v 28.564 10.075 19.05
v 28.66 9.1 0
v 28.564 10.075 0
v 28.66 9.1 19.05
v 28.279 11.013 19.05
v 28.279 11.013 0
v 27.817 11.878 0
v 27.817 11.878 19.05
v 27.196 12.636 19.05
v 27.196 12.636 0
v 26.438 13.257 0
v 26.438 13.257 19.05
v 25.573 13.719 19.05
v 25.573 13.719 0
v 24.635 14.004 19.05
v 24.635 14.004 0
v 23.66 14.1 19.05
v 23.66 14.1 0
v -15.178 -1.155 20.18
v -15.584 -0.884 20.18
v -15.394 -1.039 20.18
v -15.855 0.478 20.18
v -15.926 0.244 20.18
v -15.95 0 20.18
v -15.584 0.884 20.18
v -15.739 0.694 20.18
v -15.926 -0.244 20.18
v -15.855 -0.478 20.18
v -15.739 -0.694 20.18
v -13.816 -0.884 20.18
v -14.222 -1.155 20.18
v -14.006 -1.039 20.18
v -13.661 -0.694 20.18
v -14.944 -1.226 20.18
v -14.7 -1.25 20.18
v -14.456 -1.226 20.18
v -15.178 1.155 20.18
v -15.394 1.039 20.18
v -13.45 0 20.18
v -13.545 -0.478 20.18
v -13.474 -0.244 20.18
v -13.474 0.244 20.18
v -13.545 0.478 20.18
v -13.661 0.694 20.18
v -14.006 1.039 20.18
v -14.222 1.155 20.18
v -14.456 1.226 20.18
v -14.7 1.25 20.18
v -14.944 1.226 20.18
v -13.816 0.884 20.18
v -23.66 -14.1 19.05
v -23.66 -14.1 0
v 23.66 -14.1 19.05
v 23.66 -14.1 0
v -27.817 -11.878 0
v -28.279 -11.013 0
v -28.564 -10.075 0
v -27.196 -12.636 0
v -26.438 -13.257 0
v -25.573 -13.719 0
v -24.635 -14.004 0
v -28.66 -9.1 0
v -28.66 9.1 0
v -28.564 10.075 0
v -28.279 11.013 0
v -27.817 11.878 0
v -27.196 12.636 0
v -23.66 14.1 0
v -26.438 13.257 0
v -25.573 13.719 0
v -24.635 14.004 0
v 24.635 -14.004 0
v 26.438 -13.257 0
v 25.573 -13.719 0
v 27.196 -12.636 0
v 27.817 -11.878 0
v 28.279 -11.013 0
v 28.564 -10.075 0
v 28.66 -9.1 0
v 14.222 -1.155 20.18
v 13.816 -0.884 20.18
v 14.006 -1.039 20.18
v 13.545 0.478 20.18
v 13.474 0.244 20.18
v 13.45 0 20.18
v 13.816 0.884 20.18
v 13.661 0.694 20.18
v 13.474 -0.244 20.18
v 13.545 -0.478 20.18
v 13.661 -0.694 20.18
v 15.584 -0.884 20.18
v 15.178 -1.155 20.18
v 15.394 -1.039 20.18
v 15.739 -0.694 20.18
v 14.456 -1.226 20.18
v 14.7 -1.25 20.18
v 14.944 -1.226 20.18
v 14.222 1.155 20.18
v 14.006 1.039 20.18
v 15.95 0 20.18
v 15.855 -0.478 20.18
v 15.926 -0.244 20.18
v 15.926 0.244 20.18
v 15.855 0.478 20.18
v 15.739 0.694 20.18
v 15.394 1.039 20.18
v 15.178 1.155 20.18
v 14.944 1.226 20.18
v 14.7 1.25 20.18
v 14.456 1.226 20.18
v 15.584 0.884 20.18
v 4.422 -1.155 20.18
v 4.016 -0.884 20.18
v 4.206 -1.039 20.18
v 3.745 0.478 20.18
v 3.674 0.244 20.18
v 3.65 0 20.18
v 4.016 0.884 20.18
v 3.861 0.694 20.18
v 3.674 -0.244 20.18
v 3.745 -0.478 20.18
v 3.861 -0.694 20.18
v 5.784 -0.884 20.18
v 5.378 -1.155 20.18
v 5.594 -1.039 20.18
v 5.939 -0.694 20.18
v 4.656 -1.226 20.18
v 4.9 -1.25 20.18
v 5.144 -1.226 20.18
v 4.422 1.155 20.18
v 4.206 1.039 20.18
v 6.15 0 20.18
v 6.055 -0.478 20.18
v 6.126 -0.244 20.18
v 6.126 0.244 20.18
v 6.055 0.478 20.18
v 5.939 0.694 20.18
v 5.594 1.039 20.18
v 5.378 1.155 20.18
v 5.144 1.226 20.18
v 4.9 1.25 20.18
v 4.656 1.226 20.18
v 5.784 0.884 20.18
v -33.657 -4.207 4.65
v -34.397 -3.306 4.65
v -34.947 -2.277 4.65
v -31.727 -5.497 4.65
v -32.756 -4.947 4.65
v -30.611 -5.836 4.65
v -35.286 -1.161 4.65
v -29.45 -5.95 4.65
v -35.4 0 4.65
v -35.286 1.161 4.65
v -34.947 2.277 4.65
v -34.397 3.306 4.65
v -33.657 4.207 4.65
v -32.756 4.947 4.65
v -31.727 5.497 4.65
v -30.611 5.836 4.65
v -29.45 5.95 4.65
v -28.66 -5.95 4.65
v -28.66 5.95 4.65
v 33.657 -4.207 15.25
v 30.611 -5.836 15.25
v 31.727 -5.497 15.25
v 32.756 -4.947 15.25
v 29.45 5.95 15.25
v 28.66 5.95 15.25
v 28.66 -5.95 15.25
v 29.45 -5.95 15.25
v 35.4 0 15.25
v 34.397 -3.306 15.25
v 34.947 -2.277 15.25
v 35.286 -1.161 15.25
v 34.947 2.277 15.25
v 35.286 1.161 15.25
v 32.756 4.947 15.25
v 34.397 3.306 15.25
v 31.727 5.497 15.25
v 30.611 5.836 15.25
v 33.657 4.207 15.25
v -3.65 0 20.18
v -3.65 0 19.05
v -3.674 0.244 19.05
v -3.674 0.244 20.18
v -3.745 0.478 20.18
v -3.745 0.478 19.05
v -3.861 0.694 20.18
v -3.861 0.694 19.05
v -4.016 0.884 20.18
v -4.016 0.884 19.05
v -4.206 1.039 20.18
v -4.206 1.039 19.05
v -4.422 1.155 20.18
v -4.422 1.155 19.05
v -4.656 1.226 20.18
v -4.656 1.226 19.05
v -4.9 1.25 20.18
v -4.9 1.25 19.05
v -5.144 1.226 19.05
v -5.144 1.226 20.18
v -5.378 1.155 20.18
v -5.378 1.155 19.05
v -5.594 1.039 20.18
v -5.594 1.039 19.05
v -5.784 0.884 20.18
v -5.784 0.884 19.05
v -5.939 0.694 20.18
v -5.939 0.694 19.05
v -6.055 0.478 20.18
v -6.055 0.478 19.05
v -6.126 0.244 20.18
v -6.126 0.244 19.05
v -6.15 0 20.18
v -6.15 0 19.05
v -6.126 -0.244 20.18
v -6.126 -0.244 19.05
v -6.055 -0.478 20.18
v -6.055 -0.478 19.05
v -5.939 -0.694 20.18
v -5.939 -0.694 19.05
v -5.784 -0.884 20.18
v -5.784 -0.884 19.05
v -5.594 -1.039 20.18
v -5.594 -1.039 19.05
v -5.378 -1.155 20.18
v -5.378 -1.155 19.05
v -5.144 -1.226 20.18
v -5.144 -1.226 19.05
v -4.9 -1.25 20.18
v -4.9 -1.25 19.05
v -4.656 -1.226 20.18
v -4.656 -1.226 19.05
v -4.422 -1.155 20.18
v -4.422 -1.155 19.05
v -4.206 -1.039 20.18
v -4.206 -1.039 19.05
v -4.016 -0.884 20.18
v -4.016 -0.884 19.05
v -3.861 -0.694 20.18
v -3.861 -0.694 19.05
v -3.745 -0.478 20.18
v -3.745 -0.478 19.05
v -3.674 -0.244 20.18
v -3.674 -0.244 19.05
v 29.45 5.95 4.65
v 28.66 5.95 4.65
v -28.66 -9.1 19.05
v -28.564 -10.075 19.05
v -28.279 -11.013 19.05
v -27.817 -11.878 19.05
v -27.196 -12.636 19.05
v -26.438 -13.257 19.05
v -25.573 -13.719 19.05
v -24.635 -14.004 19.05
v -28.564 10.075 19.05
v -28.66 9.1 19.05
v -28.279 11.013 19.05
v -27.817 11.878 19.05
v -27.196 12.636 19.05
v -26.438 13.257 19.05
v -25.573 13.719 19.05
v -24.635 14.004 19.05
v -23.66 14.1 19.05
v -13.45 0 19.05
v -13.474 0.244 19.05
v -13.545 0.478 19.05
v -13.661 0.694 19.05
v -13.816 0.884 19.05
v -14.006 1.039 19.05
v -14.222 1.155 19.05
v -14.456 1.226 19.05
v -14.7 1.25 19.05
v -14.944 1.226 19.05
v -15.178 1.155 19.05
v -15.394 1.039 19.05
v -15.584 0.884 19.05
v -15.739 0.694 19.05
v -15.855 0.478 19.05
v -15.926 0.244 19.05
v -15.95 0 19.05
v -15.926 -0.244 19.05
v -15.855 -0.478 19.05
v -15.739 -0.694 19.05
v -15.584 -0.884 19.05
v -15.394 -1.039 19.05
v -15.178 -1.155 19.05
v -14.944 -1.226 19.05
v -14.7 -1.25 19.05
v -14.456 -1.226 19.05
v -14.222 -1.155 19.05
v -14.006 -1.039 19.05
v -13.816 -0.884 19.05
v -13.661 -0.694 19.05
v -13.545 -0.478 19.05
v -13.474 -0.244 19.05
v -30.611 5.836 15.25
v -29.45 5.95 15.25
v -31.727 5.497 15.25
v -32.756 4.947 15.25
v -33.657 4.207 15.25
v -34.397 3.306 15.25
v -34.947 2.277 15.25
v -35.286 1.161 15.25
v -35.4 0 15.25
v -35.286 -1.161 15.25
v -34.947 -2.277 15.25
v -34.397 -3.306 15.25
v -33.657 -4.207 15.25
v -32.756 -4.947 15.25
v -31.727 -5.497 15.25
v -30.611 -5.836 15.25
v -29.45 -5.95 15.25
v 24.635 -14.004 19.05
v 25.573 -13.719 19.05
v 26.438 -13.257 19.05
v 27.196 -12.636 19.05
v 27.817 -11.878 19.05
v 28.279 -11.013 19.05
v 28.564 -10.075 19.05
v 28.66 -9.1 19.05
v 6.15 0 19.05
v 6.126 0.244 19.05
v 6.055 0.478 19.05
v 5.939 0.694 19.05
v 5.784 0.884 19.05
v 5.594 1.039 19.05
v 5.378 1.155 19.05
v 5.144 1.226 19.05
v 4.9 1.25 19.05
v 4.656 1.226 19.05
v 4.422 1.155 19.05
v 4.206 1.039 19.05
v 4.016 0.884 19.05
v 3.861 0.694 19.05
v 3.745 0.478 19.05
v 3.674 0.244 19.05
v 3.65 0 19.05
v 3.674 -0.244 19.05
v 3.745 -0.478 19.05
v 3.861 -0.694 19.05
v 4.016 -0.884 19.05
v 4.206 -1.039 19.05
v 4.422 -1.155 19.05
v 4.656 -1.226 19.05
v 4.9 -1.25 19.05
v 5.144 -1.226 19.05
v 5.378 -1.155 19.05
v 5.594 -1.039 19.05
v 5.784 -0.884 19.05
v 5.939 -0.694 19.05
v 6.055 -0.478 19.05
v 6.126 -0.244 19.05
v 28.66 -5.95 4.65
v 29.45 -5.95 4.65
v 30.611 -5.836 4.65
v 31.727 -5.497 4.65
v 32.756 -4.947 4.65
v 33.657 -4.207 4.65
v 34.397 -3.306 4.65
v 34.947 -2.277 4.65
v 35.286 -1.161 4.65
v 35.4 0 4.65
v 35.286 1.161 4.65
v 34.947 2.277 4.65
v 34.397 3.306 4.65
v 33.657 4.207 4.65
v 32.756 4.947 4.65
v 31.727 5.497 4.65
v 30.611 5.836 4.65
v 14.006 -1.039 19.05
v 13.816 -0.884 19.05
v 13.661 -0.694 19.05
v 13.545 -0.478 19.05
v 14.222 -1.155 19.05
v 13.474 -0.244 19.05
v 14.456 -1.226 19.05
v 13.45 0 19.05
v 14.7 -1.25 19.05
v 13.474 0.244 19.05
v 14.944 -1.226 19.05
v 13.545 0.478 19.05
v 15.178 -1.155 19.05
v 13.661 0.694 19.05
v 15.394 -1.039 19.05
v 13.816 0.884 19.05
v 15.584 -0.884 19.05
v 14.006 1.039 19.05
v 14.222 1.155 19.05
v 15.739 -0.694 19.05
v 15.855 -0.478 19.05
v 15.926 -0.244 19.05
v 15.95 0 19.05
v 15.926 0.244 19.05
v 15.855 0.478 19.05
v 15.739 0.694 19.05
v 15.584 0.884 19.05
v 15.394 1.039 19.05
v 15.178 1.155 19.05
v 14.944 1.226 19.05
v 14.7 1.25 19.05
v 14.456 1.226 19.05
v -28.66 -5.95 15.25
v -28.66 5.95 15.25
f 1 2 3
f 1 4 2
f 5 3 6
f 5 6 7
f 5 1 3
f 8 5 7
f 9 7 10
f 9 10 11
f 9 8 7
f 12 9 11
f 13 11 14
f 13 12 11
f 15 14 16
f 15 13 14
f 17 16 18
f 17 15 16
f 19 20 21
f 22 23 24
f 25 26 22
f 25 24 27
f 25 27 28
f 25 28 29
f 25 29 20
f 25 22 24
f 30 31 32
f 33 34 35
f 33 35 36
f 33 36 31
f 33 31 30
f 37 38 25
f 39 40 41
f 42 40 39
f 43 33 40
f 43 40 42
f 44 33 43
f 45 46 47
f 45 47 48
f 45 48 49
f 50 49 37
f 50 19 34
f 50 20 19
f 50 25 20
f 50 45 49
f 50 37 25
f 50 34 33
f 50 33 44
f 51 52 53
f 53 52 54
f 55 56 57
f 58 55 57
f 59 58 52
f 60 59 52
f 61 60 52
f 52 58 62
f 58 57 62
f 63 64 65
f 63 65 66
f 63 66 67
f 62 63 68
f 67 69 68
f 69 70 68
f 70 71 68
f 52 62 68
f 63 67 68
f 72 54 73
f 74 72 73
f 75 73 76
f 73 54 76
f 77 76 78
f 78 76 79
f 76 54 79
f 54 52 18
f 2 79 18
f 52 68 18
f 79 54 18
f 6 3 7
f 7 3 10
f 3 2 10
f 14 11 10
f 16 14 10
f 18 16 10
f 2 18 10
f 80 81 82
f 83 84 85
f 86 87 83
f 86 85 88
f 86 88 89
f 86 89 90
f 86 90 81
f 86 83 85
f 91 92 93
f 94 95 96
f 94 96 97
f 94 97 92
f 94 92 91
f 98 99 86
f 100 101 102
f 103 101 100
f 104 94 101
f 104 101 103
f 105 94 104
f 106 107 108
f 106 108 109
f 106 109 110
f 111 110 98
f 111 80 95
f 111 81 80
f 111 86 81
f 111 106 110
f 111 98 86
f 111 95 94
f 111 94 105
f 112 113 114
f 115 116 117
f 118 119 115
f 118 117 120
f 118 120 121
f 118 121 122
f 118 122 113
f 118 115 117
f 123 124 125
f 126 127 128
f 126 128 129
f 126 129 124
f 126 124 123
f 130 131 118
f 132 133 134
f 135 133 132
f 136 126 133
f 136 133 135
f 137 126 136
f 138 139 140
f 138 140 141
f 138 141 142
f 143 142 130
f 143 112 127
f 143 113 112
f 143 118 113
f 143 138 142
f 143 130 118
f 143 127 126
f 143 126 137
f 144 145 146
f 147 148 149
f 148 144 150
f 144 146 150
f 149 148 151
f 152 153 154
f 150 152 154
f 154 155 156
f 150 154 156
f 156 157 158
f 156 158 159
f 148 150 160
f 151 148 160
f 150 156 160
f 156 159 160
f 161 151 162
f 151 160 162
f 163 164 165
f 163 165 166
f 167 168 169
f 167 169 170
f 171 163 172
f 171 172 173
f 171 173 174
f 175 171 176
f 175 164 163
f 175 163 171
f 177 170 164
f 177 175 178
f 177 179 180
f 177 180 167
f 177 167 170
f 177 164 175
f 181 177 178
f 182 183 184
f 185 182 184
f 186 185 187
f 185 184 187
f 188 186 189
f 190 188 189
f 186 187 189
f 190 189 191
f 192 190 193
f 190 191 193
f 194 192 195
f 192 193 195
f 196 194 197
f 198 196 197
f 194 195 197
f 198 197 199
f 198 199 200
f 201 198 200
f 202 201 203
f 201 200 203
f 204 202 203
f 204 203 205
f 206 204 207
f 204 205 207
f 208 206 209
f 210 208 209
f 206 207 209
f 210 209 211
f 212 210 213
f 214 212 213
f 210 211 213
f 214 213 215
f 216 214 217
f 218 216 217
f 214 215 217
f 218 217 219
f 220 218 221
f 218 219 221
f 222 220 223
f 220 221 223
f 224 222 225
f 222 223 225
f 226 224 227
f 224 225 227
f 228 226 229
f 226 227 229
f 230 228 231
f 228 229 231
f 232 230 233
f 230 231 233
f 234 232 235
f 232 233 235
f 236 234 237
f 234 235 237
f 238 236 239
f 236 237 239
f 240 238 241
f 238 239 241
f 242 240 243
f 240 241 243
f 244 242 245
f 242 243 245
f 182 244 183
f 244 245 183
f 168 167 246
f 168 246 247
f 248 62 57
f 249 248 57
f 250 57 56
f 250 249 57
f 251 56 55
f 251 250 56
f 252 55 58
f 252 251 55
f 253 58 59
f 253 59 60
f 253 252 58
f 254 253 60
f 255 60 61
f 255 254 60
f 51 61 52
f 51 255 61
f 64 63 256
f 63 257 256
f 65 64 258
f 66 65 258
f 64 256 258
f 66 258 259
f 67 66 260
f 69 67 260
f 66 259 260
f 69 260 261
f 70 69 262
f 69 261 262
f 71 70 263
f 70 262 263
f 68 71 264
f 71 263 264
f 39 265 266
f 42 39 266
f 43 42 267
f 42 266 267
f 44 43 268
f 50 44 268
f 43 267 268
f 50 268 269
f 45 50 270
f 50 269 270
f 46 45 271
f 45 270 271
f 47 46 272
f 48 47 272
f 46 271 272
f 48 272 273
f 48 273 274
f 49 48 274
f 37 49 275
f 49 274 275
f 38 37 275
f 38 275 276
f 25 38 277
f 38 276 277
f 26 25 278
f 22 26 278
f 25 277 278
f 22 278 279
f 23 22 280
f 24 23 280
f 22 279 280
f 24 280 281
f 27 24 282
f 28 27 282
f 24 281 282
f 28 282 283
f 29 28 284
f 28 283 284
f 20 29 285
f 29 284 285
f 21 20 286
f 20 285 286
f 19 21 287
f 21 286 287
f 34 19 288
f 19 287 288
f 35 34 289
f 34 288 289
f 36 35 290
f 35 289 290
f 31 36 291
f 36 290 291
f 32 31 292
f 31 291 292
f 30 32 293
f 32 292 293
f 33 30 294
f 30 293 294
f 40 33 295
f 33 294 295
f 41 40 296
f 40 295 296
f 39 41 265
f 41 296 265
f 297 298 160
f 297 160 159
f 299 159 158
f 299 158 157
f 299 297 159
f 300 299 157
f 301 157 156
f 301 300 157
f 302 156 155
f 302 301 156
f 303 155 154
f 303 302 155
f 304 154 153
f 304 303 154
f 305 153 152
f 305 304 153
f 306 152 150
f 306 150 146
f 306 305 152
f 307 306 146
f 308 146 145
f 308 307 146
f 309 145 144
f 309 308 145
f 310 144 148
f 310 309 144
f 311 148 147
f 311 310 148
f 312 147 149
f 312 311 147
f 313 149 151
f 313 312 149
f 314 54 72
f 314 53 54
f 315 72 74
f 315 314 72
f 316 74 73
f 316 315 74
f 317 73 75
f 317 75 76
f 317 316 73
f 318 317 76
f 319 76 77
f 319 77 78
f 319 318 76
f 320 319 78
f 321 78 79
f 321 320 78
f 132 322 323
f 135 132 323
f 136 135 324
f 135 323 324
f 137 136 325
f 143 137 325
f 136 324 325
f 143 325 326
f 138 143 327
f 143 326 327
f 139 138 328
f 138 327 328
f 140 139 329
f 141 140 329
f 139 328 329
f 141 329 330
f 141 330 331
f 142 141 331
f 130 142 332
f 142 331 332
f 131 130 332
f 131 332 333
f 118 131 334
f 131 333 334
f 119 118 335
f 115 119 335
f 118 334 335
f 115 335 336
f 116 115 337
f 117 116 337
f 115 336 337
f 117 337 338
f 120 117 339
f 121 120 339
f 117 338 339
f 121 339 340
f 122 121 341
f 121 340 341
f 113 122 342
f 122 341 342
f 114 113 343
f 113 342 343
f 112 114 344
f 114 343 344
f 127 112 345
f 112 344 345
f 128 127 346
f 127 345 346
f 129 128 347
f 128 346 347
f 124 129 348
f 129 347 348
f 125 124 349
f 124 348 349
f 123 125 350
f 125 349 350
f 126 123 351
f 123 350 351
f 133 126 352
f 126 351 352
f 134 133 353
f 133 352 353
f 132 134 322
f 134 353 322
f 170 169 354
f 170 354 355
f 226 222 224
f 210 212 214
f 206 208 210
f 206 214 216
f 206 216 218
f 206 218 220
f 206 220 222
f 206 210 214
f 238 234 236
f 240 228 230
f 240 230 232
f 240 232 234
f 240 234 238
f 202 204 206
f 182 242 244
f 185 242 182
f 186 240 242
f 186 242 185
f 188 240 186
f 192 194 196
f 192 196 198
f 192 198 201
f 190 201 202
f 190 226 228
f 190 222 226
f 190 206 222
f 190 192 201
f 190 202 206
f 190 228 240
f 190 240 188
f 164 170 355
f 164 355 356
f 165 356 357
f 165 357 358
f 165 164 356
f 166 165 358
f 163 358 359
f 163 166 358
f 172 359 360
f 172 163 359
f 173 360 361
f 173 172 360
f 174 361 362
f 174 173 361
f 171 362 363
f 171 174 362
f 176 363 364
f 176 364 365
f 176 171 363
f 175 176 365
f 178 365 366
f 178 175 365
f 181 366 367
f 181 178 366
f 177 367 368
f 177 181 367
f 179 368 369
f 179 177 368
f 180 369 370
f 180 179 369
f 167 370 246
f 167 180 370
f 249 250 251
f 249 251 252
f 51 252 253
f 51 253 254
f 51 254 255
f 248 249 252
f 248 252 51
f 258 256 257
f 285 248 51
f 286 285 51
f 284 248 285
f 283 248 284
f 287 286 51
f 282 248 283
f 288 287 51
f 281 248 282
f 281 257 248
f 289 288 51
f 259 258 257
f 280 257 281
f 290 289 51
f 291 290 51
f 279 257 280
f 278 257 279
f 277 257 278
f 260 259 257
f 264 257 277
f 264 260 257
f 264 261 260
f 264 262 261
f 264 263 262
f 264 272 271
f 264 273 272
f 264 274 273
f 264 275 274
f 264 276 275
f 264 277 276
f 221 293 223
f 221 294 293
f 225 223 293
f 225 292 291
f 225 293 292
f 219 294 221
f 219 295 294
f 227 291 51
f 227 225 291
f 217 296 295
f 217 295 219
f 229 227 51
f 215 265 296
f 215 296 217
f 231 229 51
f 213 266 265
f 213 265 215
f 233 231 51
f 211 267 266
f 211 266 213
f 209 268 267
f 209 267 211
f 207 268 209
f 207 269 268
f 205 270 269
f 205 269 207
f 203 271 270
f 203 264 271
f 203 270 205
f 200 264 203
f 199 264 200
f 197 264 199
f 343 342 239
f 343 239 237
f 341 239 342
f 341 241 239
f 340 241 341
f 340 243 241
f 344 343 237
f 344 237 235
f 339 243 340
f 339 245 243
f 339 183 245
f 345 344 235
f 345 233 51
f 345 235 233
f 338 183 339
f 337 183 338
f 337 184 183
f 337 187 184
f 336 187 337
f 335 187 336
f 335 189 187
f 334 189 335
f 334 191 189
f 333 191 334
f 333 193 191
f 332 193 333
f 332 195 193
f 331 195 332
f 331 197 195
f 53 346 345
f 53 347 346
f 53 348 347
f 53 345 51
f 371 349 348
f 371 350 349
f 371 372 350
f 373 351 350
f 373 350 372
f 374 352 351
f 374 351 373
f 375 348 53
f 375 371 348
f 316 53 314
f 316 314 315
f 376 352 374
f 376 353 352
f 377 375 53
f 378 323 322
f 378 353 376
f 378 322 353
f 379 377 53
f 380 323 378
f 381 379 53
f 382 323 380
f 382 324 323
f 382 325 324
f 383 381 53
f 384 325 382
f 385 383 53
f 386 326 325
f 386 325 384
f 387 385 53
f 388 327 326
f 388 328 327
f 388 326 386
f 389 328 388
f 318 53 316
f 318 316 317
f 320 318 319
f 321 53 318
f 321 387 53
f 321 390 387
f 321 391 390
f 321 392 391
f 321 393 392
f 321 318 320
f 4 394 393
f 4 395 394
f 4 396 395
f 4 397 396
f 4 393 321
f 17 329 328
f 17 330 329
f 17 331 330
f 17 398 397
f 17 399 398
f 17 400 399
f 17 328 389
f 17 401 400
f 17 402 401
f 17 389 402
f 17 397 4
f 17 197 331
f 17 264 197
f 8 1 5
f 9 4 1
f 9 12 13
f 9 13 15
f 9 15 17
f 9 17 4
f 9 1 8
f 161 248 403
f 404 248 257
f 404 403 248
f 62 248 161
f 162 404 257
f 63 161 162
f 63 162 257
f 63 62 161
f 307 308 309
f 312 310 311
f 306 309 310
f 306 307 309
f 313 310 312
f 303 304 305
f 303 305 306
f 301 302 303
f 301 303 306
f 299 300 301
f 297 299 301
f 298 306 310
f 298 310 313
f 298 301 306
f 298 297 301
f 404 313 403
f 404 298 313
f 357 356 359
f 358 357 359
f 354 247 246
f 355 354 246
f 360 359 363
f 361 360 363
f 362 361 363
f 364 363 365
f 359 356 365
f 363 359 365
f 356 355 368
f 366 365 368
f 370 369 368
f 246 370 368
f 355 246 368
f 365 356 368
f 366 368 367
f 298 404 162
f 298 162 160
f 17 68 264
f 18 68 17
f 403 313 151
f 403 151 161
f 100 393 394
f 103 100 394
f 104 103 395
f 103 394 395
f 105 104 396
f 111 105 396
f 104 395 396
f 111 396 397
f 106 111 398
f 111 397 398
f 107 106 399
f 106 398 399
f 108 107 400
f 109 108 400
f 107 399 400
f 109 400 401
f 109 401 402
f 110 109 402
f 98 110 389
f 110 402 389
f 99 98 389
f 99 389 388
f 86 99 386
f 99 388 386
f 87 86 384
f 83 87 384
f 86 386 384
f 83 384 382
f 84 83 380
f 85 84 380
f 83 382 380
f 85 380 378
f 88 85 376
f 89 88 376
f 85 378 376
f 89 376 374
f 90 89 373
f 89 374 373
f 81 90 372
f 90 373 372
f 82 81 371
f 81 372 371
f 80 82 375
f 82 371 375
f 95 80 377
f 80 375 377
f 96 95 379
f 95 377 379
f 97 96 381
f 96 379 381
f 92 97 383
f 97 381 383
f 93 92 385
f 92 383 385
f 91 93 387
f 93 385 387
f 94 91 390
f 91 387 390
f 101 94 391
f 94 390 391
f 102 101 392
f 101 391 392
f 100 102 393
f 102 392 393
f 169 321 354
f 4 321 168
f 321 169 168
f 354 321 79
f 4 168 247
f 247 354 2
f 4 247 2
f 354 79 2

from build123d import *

# Parameters (mm, degrees)
F0_W     = 57.32
F0_H     = 28.2
F1_DEPTH = 19.05
F2_R     = 5
F5_DEPTH = 10.6
F6_R     = 1.25
F7_DEPTH = 1.13


with BuildPart() as f1:
    # F0 (on Top) → F1 (new body)
    with BuildSketch(Plane.XY):
        Rectangle(F0_W, F0_H)
    extrude(amount=F1_DEPTH)

    # F2
    f2_edges = [f1.edges().sort_by_distance(p)[0] for p in [
        (-28.66, 14.1, 9.525),
        (-28.66, -14.1, 9.525),
        (28.66, -14.1, 9.525),
        (28.66, 14.1, 9.525),
    ]]
    fillet(f2_edges, radius=F2_R)

    # F4 (on offset) → F5 (join)
    with BuildSketch(Plane.XY.offset(15.25)):
        with BuildLine():
            Line((-27.716206, 5.95), (-29.45, 5.95))
            ThreePointArc((-29.45, 5.95), (-35.4, 0), (-29.45, -5.95))
            Line((-29.45, -5.95), (-27.716206, -5.95))
            Line((-27.716206, -5.95), (-27.716206, 5.95))
        make_face()
        with BuildLine():
            Line((27.716206, -5.95), (29.45, -5.95))
            ThreePointArc((29.45, -5.95), (35.4, 0), (29.45, 5.95))
            Line((29.45, 5.95), (27.716206, 5.95))
            Line((27.716206, 5.95), (27.716206, -5.95))
        make_face()
    extrude(amount=-F5_DEPTH)

    # F6 (on face) → F7 (join)
    with BuildSketch(Plane.XY.offset(19.05)):
        with Locations((-14.7, 0)):
            Circle(F6_R)
        with Locations((-4.9, 0)):
            Circle(F6_R)
        with Locations((4.9, 0)):
            Circle(F6_R)
        with Locations((14.7, 0)):
            Circle(F6_R)
    extrude(amount=F7_DEPTH)


solid = f1.part
